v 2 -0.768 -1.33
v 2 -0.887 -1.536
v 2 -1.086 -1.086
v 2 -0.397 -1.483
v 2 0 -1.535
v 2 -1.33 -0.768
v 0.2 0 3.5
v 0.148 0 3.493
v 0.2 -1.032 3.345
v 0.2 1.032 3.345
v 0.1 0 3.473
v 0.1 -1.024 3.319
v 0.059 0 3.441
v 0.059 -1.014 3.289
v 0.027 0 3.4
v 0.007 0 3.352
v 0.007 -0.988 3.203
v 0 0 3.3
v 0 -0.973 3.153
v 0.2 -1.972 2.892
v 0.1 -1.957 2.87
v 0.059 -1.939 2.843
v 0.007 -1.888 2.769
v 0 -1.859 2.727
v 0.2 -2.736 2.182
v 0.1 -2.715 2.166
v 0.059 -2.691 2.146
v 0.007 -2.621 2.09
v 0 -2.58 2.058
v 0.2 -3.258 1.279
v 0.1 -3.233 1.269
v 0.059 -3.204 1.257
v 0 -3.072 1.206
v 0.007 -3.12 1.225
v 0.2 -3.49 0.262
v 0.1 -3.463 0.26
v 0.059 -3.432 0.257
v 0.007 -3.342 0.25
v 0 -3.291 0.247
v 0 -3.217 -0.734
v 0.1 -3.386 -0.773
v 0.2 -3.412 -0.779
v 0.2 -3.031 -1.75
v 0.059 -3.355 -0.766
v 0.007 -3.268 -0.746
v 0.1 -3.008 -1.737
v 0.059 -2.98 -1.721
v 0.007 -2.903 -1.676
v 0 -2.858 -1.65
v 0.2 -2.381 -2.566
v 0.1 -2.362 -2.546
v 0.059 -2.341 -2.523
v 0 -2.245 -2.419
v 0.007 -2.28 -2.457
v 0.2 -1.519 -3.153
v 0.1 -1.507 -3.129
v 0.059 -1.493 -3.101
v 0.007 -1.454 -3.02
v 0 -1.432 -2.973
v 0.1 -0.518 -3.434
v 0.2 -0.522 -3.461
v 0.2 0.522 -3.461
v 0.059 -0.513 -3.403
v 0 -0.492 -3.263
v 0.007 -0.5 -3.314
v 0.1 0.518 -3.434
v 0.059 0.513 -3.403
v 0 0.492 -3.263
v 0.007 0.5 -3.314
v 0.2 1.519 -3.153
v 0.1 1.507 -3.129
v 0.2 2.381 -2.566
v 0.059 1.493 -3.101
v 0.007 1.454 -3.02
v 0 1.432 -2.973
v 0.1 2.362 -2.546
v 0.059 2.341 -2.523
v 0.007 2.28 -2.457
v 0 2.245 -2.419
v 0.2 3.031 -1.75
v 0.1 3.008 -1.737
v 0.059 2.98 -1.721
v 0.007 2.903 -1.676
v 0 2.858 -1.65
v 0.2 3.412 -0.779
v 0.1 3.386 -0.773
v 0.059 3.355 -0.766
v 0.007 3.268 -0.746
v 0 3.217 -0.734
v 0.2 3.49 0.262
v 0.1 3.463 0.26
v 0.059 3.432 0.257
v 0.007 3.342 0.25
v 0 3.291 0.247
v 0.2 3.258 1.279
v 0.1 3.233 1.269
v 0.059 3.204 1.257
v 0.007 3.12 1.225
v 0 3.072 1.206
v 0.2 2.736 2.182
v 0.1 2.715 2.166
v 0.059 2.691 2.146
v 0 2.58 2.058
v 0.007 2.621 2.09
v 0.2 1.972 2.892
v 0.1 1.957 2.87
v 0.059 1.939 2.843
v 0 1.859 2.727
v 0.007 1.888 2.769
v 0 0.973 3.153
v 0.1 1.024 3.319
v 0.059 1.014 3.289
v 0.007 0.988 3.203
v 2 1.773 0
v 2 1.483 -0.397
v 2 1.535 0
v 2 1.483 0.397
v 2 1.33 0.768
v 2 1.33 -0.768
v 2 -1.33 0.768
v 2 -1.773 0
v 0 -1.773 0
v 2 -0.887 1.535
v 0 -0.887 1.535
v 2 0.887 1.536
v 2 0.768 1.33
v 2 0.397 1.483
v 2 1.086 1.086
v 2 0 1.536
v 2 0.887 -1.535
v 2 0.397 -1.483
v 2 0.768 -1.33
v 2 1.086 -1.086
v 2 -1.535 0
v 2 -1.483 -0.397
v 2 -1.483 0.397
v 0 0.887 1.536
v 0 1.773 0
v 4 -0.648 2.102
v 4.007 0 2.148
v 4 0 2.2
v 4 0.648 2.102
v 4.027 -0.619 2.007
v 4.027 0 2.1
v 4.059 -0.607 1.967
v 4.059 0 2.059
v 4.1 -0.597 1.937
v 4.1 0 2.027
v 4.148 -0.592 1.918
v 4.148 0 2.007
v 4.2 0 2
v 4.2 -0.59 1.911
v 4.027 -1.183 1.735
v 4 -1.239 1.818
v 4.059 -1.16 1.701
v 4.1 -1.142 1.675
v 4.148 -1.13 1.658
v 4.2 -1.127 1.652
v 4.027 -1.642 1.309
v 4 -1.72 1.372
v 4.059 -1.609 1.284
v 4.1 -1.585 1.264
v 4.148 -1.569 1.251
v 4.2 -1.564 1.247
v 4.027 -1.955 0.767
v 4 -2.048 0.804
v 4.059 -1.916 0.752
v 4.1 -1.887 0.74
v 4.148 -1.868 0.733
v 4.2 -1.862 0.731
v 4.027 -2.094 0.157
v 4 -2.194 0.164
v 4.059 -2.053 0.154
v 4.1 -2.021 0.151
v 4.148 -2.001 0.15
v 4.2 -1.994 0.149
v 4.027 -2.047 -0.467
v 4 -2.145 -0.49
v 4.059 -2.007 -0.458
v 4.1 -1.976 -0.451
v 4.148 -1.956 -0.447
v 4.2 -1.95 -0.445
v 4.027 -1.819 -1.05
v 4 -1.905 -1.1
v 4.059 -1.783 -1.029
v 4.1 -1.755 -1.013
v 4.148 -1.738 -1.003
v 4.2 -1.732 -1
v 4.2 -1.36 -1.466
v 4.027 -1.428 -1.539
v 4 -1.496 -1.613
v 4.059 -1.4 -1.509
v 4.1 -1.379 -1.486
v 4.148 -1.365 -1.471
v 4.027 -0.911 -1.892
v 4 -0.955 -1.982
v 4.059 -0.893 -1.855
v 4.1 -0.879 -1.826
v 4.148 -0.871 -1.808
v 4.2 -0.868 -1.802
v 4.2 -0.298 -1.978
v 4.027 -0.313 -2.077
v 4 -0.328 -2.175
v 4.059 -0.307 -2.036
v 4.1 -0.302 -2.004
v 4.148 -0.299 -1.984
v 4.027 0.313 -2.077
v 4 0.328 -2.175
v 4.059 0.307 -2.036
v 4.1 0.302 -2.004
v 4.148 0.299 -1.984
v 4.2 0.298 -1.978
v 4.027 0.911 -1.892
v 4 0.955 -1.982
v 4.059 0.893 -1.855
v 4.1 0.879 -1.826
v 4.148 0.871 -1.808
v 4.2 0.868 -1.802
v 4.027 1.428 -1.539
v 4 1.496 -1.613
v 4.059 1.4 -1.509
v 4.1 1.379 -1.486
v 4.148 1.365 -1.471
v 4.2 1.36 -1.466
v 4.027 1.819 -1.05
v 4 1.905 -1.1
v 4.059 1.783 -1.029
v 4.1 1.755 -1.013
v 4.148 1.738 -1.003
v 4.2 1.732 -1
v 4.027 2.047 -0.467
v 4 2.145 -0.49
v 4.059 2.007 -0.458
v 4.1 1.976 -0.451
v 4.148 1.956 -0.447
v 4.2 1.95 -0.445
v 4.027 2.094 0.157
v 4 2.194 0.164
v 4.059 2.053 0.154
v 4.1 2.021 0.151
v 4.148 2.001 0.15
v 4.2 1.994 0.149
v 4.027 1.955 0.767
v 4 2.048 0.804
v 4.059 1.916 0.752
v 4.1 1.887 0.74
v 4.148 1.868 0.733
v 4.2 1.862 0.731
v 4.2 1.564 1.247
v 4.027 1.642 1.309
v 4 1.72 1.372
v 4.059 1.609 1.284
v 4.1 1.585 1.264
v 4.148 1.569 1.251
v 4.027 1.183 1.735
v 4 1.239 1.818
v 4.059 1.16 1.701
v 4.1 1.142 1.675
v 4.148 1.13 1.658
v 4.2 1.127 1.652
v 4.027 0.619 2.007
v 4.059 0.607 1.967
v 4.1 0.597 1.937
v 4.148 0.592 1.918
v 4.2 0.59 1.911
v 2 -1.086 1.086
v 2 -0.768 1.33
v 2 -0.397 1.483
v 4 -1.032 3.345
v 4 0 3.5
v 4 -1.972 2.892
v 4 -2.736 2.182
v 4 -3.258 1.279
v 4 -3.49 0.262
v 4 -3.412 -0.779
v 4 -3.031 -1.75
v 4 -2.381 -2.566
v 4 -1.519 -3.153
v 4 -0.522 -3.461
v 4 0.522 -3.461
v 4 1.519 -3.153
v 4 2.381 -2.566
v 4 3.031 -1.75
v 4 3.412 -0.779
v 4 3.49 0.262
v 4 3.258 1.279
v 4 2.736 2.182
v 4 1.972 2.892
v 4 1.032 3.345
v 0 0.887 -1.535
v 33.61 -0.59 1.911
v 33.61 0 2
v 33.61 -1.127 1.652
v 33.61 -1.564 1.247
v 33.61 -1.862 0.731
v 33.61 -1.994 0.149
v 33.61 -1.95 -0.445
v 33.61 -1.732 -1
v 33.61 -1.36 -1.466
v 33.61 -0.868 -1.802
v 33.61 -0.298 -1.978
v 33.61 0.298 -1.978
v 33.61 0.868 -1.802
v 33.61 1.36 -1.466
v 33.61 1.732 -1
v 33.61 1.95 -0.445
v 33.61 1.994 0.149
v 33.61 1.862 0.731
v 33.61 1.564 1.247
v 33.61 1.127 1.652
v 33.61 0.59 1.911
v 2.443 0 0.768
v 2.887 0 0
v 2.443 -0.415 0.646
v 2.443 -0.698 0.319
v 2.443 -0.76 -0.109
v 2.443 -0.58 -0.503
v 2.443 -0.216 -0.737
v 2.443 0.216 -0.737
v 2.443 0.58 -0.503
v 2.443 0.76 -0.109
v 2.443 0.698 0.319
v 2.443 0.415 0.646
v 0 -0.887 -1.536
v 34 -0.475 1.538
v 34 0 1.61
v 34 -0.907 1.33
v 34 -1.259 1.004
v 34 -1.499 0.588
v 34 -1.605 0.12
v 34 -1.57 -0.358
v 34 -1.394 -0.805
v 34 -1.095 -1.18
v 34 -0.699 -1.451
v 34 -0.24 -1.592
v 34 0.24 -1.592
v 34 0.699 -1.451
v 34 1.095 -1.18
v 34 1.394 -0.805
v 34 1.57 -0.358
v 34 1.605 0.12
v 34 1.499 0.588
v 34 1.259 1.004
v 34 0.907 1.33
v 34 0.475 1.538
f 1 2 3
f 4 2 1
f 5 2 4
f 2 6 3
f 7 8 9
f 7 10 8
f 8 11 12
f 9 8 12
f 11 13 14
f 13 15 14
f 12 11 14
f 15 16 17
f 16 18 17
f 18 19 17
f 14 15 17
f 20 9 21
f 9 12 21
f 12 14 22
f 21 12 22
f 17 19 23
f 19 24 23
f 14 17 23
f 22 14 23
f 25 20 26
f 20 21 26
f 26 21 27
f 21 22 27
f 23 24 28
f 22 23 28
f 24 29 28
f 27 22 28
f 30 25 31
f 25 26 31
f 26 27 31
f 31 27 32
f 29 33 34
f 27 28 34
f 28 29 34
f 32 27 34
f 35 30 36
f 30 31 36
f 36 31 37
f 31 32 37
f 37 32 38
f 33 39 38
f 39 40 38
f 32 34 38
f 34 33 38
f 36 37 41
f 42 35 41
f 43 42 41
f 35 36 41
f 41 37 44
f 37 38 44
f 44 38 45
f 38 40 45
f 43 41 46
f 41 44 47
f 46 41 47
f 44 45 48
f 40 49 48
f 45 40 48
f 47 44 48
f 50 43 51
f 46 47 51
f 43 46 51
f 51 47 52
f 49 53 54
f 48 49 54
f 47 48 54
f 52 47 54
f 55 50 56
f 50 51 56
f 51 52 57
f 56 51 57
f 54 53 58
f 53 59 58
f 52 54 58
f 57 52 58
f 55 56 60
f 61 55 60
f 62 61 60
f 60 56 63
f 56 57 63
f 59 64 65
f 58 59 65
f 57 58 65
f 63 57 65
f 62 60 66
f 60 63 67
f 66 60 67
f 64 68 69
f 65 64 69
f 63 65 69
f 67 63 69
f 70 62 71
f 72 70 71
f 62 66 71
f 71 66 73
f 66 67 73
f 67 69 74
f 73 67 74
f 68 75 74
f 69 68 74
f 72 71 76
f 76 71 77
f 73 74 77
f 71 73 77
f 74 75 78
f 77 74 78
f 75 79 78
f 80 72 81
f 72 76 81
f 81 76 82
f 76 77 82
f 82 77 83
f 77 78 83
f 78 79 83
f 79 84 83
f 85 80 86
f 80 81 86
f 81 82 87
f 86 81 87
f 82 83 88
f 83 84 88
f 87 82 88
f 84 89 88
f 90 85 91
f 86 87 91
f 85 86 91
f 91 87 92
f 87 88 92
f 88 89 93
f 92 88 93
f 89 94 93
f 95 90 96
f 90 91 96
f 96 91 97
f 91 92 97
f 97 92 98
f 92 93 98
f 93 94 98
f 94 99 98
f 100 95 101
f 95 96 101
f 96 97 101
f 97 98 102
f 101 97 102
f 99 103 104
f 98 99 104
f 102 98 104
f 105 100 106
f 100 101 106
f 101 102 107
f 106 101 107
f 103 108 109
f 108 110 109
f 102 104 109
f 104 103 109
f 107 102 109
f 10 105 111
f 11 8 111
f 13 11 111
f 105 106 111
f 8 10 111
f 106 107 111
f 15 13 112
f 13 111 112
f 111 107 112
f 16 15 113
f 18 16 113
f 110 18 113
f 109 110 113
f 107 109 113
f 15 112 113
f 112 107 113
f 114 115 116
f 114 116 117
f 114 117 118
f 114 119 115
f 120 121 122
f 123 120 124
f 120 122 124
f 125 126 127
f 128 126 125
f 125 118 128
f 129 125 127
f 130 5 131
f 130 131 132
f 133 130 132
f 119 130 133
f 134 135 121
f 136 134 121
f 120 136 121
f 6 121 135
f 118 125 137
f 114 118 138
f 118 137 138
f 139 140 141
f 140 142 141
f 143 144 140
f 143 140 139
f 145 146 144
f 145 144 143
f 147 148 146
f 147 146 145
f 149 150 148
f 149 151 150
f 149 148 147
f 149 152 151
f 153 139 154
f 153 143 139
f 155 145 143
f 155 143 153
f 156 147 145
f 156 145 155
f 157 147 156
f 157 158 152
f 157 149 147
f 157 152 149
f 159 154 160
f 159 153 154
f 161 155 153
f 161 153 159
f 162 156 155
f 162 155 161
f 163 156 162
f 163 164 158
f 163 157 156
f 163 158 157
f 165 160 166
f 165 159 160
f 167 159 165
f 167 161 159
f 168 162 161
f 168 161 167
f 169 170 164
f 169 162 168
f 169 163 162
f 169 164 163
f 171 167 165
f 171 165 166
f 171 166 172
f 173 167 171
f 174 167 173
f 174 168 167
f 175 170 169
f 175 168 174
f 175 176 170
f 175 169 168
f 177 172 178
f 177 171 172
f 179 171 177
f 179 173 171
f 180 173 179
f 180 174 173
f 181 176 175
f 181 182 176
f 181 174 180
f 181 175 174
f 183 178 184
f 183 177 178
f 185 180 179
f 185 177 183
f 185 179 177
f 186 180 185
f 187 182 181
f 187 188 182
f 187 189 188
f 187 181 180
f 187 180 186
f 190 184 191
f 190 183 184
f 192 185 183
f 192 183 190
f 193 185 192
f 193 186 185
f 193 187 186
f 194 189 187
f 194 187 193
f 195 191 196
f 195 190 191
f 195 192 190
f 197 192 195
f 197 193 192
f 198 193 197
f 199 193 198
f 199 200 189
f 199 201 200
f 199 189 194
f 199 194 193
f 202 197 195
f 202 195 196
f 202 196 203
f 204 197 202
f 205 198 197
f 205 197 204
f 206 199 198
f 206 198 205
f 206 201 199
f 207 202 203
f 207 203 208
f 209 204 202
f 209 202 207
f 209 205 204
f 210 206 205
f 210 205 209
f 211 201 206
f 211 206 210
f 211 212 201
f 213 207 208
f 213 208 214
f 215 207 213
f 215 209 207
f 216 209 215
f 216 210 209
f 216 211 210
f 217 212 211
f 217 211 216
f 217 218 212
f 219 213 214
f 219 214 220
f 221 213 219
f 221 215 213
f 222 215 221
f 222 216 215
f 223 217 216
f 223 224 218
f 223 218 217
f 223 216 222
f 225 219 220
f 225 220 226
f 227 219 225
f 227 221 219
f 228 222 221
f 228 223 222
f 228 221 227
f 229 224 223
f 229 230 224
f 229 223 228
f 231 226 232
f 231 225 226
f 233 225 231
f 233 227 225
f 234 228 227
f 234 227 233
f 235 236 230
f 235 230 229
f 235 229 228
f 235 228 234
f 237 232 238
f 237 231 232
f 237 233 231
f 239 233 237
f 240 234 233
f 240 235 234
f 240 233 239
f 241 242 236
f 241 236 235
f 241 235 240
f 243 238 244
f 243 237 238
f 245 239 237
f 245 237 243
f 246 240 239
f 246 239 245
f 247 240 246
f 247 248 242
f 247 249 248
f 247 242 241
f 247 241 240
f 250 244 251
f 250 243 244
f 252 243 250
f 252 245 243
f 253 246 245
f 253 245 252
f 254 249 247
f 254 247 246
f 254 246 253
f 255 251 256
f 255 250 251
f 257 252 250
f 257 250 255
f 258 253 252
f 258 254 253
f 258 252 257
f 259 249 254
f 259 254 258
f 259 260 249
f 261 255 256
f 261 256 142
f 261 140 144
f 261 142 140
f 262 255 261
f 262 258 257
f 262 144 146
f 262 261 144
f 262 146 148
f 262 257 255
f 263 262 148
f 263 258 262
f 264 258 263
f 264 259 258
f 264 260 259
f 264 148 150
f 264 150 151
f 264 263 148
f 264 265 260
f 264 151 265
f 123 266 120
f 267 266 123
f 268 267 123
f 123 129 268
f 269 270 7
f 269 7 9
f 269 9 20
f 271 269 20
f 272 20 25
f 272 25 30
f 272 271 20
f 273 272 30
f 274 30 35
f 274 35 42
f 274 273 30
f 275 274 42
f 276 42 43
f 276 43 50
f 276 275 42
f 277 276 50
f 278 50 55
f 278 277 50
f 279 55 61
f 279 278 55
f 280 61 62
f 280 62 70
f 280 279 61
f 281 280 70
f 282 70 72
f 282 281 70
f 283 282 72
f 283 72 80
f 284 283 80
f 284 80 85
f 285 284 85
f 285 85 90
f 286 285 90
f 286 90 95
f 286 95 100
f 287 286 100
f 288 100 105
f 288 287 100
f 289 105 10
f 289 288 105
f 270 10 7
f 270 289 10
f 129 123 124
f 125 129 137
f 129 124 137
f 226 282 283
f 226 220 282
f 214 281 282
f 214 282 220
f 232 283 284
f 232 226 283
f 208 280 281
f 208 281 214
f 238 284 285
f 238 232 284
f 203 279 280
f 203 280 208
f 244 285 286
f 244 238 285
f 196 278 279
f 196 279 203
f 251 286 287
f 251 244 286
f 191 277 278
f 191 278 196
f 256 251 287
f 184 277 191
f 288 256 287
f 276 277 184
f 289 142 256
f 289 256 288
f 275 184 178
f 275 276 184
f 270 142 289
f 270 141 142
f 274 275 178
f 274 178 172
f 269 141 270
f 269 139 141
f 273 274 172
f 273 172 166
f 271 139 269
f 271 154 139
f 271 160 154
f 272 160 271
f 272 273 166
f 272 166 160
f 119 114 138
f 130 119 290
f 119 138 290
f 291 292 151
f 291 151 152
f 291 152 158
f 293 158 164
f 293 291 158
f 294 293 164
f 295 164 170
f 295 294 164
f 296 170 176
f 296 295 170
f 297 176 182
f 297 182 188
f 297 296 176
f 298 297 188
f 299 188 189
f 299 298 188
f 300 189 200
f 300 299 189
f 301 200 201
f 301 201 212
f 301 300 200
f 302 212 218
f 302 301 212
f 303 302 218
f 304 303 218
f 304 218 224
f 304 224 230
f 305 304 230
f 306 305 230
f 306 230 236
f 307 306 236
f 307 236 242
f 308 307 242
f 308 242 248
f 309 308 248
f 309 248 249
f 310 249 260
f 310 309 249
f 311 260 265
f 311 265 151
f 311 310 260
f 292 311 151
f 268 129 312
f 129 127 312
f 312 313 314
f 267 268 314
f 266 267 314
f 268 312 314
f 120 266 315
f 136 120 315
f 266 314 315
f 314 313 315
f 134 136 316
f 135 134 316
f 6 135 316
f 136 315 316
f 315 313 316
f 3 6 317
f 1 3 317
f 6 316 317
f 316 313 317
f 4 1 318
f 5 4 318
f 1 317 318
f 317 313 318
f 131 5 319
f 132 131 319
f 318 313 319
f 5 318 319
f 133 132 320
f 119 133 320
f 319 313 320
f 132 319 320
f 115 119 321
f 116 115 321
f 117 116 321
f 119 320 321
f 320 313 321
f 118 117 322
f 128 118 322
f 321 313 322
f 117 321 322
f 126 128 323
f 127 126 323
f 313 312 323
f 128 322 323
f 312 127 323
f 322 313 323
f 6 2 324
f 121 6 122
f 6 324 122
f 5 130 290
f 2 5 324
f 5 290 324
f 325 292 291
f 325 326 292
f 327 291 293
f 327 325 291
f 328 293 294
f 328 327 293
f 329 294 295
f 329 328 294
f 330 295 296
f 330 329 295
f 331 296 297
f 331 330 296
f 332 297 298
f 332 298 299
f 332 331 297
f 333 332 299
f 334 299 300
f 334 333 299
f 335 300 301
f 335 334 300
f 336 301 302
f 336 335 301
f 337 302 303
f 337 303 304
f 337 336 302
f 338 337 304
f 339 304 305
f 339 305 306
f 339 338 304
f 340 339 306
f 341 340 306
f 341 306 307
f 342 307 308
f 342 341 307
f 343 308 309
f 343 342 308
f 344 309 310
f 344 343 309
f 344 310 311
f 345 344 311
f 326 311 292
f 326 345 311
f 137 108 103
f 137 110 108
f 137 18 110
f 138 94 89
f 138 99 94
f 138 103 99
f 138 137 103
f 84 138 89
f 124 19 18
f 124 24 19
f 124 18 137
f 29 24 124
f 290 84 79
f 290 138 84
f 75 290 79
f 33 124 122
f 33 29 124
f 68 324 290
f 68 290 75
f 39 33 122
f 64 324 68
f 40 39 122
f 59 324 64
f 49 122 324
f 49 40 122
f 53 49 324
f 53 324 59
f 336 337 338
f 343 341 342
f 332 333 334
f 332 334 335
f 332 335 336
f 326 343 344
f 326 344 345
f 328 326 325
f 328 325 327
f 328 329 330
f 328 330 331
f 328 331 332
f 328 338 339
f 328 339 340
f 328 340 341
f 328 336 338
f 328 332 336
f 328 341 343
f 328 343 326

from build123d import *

# Parameters (mm, degrees)
FILLET1_R   = 0.2
FILLET2_R   = 0.2
HEX_2_DEPTH = 2


with BuildPart() as part:
    # BodySke → Base-Revolve (revolve)
    with BuildSketch(Plane.XY, mode=Mode.PRIVATE) as base_revolve_sk:
        Polygon((0, 0), (0, 3.5), (4, 3.5), (4, 2), (33.61, 2), (34, 1.61), (34, 0), align=None)
    revolve(base_revolve_sk.sketch.rotate(Axis((-31.75, 0, 0), (1, 0, 0)), 90), axis=Axis((-31.75, 0, 0), (1, 0, 0)))  # turned: the seam where the file's is

    # Fillet1
    fillet1_edges = [part.edges().sort_by_distance(p)[0] for p in [
        (4, 0, -2),
    ]]
    fillet(fillet1_edges, radius=FILLET1_R)

    # Fillet2
    fillet2_edges = [part.edges().sort_by_distance(p)[0] for p in [
        (0, 0, -3.5),
    ]]
    fillet(fillet2_edges, radius=FILLET2_R)

    # Sketch2 → Hex-PreBroach (revolve, cut)
    with BuildSketch(Plane.XY, mode=Mode.PRIVATE) as hex_prebroach_sk:
        Polygon((0, 1.5355), (2, 1.5355), (2.886521338, 0), (0, 0), align=None)
    revolve(hex_prebroach_sk.sketch.rotate(Axis((0, 0, 0), (1, 0, 0)), 90), axis=Axis((0, 0, 0), (1, 0, 0)), mode=Mode.SUBTRACT)  # turned: the seam where the file's is

    # Sketch3 → Hex 2 (cut)
    with BuildSketch(Plane(origin=(0, 0, 0), x_dir=(0, 0.5, 0.866025404), z_dir=(-1, 0, 0))):
        Polygon((0.886521338, 1.5355), (-0.886521338, 1.5355), (-1.773042677, 0), (-0.886521338, -1.5355), (0.886521338, -1.5355), (1.773042677, 0), align=None)
    extrude(amount=-HEX_2_DEPTH, mode=Mode.SUBTRACT)


solid = part.part
